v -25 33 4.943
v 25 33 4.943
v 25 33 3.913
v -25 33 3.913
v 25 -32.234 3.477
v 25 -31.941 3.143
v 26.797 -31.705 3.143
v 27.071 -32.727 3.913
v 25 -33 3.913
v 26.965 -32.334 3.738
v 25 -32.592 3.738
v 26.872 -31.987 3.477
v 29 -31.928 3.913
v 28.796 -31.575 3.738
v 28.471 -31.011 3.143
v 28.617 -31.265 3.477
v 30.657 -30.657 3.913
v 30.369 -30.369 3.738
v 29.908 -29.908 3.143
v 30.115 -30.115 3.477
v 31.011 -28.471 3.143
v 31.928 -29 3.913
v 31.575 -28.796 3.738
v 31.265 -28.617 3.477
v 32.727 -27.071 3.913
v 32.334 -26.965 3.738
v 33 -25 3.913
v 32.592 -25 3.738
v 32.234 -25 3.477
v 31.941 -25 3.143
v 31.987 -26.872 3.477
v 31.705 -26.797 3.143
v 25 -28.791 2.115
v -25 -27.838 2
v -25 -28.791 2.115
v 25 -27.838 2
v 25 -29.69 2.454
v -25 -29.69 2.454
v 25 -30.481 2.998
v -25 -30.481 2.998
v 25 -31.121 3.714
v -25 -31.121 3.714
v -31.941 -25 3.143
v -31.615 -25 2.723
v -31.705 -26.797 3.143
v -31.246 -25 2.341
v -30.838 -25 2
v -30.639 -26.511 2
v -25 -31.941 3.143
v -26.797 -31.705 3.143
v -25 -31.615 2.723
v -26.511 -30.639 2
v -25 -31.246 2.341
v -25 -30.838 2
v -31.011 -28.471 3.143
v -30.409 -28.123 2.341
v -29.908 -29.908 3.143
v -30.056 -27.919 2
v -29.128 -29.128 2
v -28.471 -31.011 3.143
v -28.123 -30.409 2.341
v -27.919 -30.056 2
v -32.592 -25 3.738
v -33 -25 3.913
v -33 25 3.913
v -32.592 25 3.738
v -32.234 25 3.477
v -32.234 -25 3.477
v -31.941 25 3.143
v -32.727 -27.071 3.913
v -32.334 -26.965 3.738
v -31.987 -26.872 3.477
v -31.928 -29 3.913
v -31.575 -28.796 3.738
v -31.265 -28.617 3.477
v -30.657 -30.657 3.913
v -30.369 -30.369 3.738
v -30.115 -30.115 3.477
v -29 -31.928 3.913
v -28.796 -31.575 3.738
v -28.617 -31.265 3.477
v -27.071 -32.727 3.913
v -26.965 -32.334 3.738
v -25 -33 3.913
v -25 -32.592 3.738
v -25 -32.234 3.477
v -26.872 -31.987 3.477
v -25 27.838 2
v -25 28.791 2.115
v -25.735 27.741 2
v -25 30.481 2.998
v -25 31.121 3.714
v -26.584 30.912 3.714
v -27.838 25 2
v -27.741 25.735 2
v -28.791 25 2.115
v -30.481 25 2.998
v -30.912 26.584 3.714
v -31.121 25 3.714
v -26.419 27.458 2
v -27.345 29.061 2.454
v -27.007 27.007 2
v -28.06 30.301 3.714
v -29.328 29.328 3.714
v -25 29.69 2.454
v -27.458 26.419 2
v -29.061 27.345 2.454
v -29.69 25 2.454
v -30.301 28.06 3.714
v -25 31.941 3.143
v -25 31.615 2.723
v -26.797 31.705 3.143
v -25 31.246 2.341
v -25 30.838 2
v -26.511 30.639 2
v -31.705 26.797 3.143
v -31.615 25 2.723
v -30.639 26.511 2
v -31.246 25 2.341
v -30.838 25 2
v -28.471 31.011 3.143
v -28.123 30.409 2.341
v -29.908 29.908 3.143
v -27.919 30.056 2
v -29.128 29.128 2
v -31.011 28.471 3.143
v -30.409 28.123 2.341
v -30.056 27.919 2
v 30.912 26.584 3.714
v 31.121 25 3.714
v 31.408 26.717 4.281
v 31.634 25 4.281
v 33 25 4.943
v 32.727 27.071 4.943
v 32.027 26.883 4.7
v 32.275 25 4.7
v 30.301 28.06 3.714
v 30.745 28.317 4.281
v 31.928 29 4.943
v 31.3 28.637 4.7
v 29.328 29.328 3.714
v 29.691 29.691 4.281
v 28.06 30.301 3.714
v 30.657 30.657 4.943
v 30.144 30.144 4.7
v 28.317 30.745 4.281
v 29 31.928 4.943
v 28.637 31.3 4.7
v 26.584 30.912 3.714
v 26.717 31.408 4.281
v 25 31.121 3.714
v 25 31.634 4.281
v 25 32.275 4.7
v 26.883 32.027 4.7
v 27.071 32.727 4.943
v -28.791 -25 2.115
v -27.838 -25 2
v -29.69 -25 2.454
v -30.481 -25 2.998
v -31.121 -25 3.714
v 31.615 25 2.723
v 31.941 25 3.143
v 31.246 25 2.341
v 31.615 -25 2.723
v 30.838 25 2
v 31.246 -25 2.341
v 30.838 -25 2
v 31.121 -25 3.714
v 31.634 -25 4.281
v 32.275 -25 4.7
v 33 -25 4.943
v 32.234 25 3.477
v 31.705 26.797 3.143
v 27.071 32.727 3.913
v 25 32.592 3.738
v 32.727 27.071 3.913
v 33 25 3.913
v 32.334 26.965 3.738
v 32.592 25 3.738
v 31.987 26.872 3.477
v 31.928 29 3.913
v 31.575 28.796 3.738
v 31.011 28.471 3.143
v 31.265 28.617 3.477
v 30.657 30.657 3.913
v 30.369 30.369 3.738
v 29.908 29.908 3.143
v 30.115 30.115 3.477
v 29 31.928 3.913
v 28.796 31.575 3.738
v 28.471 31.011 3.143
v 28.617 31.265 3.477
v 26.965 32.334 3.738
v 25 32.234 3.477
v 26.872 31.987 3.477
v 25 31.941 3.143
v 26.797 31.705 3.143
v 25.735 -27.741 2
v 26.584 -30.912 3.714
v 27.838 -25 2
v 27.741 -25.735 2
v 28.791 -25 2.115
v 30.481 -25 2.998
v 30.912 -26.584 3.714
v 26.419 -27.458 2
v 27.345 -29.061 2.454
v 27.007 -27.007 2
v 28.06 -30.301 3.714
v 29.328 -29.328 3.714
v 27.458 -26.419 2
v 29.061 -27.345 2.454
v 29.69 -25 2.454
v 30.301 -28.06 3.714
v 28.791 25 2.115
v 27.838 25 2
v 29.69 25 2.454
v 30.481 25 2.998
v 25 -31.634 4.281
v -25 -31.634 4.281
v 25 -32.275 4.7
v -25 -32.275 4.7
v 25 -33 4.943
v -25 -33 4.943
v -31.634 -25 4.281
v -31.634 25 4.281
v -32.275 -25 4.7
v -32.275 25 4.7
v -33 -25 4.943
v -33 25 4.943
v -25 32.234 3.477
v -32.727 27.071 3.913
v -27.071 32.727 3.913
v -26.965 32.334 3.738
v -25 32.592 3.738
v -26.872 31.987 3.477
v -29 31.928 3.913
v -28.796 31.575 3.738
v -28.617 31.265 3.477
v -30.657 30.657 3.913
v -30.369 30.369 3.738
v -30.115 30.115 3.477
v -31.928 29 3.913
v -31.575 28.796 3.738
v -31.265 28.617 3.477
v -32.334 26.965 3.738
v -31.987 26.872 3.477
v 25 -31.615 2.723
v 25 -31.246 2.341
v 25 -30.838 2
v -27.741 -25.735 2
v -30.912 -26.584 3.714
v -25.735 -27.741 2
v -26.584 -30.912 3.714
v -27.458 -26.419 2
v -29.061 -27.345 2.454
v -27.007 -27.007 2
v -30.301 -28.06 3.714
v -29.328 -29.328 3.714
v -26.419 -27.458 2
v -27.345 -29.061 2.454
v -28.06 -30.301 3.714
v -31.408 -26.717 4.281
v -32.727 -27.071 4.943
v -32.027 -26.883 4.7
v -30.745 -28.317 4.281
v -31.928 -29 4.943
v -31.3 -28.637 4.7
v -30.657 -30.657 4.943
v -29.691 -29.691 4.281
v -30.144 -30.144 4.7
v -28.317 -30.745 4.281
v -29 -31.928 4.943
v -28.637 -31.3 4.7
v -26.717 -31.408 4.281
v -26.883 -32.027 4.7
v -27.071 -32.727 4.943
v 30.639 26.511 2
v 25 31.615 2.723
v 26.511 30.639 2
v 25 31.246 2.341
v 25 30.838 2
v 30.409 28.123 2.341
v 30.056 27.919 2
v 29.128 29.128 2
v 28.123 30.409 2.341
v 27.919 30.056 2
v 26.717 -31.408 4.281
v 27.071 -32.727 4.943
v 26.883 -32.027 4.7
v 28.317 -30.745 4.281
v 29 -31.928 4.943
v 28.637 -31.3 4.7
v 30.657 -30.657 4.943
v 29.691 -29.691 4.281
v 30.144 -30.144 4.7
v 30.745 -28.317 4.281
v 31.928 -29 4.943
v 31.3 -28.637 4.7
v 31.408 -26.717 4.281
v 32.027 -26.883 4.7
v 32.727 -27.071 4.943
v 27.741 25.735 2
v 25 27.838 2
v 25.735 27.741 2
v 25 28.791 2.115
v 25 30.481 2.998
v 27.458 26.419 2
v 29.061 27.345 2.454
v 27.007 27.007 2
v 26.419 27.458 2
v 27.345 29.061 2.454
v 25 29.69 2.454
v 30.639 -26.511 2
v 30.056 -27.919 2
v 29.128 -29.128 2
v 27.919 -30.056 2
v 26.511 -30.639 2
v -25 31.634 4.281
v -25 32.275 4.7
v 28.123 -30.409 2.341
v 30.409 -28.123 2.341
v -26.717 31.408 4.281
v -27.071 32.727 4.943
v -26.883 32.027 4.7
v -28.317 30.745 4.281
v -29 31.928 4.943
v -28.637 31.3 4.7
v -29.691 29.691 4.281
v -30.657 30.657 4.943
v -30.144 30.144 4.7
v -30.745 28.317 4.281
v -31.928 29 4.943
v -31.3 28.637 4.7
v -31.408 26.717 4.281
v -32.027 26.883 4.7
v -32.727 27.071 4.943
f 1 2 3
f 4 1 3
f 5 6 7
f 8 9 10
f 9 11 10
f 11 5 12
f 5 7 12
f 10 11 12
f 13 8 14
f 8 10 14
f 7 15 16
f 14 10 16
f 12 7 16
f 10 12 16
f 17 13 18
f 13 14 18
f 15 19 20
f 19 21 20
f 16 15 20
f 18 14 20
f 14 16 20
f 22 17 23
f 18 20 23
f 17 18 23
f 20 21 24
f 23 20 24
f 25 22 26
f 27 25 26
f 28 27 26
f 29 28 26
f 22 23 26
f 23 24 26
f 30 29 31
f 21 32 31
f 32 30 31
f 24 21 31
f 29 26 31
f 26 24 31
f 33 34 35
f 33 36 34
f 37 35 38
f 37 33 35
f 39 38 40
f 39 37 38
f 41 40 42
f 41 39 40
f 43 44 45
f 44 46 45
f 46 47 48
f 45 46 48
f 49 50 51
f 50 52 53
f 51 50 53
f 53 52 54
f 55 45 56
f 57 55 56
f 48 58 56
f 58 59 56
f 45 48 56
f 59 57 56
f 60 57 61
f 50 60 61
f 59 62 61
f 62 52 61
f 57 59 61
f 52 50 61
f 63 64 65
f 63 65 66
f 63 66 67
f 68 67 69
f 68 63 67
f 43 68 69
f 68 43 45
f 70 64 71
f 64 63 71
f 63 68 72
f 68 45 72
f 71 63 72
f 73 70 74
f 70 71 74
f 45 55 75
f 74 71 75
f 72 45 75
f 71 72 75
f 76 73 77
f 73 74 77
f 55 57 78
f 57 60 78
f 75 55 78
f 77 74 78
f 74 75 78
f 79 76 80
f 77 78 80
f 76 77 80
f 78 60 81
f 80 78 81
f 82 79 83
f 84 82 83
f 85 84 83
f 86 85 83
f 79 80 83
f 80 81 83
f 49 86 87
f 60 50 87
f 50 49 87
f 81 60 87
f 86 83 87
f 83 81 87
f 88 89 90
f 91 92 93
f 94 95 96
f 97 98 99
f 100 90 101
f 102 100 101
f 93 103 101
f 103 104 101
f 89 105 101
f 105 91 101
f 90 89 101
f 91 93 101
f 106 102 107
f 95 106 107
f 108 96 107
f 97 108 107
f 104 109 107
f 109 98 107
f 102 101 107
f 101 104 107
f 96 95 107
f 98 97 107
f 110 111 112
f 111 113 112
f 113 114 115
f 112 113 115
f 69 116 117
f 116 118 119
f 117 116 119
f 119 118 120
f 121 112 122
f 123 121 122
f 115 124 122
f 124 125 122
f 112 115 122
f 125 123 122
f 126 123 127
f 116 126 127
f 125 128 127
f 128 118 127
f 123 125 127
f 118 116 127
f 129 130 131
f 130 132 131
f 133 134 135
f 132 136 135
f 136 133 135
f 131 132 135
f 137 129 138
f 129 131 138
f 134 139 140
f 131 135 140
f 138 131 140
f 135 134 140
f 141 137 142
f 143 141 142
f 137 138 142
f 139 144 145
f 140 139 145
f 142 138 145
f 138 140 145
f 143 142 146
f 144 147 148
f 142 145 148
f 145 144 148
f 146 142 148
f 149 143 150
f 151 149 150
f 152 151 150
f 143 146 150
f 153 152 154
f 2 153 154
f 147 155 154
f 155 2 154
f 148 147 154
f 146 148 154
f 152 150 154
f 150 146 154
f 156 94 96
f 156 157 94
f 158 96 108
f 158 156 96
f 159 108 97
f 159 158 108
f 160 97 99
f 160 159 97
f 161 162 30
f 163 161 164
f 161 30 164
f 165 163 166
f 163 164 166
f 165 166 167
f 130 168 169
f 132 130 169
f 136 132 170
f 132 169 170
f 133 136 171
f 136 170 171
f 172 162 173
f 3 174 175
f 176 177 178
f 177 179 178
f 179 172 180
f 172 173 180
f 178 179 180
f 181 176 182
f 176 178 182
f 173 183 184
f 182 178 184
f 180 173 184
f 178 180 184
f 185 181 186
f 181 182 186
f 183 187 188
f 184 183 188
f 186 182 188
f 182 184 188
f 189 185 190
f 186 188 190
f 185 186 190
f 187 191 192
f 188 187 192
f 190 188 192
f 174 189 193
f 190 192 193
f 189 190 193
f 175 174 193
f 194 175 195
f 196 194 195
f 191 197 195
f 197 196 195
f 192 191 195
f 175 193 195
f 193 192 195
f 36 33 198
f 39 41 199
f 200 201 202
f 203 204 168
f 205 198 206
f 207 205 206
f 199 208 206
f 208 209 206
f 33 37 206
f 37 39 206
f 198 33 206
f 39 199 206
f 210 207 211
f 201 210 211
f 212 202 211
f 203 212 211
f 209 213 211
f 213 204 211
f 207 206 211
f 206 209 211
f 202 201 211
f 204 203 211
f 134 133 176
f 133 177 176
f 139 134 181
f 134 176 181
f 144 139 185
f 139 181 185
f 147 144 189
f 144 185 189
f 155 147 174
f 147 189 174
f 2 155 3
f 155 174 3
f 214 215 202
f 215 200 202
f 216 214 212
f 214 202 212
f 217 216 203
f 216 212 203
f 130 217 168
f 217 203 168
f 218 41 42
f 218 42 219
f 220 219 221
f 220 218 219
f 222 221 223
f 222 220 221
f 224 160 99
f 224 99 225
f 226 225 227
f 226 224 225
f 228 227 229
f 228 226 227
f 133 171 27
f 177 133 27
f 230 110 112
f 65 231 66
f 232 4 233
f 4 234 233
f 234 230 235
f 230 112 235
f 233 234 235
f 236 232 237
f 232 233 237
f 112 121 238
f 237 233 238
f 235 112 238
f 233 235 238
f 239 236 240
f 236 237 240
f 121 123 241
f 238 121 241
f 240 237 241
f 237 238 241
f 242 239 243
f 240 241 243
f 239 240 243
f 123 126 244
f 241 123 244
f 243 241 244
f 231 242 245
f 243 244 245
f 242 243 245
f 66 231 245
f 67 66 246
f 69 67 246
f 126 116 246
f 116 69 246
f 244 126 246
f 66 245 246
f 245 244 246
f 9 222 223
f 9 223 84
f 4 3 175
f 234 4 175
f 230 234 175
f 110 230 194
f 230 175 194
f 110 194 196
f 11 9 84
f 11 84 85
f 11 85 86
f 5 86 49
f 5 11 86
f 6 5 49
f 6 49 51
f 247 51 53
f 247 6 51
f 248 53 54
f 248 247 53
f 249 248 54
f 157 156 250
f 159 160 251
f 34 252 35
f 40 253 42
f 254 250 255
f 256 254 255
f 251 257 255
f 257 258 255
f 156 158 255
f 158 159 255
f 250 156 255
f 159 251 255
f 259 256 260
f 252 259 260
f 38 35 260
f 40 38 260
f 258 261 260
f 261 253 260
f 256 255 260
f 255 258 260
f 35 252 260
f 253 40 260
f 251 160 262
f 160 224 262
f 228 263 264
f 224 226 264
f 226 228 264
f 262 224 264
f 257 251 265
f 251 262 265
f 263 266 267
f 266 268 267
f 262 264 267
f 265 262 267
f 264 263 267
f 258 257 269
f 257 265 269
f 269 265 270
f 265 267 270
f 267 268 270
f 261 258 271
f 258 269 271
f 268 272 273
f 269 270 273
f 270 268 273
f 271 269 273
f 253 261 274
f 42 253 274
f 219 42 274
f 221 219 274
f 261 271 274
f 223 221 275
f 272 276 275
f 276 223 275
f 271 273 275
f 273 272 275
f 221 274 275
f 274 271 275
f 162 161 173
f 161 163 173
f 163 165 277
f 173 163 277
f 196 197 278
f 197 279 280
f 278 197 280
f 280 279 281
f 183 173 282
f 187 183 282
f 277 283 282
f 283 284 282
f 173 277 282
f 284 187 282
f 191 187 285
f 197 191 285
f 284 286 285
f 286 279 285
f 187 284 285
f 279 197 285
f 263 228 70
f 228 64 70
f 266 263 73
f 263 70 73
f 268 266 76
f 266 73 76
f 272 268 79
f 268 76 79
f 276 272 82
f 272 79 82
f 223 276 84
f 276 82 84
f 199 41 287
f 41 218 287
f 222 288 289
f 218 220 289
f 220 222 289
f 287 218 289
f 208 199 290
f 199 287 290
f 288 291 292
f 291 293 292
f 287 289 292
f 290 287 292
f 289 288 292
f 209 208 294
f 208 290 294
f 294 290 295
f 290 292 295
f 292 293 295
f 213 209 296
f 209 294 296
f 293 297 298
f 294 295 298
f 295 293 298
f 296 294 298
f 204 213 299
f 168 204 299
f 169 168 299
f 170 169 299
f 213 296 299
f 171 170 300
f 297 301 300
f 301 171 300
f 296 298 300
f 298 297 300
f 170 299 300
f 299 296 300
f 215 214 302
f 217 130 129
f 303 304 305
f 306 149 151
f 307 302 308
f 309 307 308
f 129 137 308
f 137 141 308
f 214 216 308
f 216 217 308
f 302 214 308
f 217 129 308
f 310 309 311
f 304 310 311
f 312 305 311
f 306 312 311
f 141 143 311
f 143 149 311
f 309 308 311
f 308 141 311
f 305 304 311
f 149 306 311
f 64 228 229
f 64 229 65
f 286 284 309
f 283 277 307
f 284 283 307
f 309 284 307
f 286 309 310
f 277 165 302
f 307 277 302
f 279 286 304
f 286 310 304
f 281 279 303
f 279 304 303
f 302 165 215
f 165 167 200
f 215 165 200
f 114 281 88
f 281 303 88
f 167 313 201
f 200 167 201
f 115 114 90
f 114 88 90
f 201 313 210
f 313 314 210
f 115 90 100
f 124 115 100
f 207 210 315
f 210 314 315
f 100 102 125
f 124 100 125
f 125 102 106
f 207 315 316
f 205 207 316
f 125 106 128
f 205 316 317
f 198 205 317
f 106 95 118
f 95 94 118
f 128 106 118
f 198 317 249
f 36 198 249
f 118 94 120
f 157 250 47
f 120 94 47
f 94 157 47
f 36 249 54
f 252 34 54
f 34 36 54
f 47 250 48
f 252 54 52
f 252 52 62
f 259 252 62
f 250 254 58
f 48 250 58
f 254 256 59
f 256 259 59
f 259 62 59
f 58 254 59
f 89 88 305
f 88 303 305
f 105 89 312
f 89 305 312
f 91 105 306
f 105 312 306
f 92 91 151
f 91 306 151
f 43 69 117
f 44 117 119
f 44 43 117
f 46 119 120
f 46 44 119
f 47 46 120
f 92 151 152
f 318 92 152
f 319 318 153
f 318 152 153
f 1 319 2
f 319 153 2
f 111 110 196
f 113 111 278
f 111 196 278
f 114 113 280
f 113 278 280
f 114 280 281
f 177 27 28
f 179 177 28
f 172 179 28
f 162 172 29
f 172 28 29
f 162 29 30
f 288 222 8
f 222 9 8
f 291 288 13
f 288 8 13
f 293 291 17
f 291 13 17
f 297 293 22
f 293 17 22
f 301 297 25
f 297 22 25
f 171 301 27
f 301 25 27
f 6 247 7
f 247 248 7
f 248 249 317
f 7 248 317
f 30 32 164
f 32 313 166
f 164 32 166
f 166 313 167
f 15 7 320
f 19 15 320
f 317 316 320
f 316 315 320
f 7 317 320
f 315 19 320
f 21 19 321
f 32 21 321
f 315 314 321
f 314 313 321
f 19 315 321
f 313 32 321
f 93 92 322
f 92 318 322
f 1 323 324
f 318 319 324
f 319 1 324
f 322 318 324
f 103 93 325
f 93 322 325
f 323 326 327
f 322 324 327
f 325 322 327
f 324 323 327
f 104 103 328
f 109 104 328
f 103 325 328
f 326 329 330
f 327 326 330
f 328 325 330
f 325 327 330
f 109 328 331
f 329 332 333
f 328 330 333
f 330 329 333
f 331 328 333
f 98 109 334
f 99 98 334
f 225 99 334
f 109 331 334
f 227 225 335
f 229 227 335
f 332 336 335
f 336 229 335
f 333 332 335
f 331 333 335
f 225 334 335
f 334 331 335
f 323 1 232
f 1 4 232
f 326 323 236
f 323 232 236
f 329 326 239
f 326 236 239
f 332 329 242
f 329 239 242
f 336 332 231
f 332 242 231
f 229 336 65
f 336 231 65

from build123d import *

# Parameters (mm, degrees)
F1_DEPTH = 25
F4_COUNT = 4
F6_ANGLE = 90
F8_COUNT = 4


with BuildPart() as f1:
    # F0 (on Front) → F1 (new body, symmetric)
    with BuildSketch(Plane.XZ):
        with BuildLine():
            ThreePointArc((-27.838012214, 2), (-29.6896524135, 2.4543789583), (-31.1206194405, 3.7142857143))
            ThreePointArc((-31.1206194405, 3.7142857143), (-31.9410332681, 4.5110438468), (-33, 4.9428908461))
            Line((-33, 4.9428908461), (-33, 3.9132711601))
            ThreePointArc((-33, 3.9132711601), (-32.40580245, 3.6171600706), (-31.9412712472, 3.1428571429))
            ThreePointArc((-31.9412712472, 3.1428571429), (-31.4353171545, 2.5273357254), (-30.838012214, 2))
            Line((-30.838012214, 2), (-27.838012214, 2))
        make_face()
    extrude(amount=F1_DEPTH, both=True)


with BuildPart() as f2_1:
    # F2: instance of F1
    add(f1.part.mirror(Plane.YZ))


with BuildPart() as f1_1:
    add(f1.part)

    add(f2_1.part)  # F4 merges F2_1
    # F4: F1, F2_1 ×4 about axis
    f4_axis = Axis((0, 0, 8.481499739), (0, 0, 1))
    for i in range(1, F4_COUNT):
        add(f1.part.rotate(f4_axis, i * 360 / F4_COUNT))
        add(f2_1.part.rotate(f4_axis, i * 360 / F4_COUNT))

    # F4_face (on face) → F6 (revolve)
    with BuildSketch(Plane(origin=(25, -31.316775031, 3.2677689392), x_dir=(0, 1, 0), z_dir=(1, 0, 0))):
        with BuildLine():
            Line((0.478762817, -1.2677689392), (3.478762817, -1.2677689392))
            ThreePointArc((3.478762817, -1.2677689392), (1.6271226175, -0.8133899809), (0.1961555904, 0.4465167751))
            ThreePointArc((0.1961555904, 0.4465167751), (-0.6242582371, 1.2432749076), (-1.683224969, 1.6751219069))
            Line((-1.683224969, 1.6751219069), (-1.683224969, 0.6455022209))
            ThreePointArc((-1.683224969, 0.6455022209), (-1.0890274191, 0.3493911314), (-0.6244962162, -0.1249117963))
            ThreePointArc((-0.6244962162, -0.1249117963), (-0.1185421236, -0.7404332138), (0.478762817, -1.2677689392))
        make_face()
    revolve(axis=Axis((25, -25, -0.1814401951), (0, 0, 1)), revolution_arc=F6_ANGLE)

    # F8: F1 ×4 about axis
    f8_axis = Axis((0, 0, 7.3843663558), (0, 0, 1))


with BuildPart() as f1_2:
    add(f1_1.part)
    for i in range(1, F8_COUNT):
        add(f1_1.part.rotate(f8_axis, i * 360 / F8_COUNT))


solid = f1_2.part
